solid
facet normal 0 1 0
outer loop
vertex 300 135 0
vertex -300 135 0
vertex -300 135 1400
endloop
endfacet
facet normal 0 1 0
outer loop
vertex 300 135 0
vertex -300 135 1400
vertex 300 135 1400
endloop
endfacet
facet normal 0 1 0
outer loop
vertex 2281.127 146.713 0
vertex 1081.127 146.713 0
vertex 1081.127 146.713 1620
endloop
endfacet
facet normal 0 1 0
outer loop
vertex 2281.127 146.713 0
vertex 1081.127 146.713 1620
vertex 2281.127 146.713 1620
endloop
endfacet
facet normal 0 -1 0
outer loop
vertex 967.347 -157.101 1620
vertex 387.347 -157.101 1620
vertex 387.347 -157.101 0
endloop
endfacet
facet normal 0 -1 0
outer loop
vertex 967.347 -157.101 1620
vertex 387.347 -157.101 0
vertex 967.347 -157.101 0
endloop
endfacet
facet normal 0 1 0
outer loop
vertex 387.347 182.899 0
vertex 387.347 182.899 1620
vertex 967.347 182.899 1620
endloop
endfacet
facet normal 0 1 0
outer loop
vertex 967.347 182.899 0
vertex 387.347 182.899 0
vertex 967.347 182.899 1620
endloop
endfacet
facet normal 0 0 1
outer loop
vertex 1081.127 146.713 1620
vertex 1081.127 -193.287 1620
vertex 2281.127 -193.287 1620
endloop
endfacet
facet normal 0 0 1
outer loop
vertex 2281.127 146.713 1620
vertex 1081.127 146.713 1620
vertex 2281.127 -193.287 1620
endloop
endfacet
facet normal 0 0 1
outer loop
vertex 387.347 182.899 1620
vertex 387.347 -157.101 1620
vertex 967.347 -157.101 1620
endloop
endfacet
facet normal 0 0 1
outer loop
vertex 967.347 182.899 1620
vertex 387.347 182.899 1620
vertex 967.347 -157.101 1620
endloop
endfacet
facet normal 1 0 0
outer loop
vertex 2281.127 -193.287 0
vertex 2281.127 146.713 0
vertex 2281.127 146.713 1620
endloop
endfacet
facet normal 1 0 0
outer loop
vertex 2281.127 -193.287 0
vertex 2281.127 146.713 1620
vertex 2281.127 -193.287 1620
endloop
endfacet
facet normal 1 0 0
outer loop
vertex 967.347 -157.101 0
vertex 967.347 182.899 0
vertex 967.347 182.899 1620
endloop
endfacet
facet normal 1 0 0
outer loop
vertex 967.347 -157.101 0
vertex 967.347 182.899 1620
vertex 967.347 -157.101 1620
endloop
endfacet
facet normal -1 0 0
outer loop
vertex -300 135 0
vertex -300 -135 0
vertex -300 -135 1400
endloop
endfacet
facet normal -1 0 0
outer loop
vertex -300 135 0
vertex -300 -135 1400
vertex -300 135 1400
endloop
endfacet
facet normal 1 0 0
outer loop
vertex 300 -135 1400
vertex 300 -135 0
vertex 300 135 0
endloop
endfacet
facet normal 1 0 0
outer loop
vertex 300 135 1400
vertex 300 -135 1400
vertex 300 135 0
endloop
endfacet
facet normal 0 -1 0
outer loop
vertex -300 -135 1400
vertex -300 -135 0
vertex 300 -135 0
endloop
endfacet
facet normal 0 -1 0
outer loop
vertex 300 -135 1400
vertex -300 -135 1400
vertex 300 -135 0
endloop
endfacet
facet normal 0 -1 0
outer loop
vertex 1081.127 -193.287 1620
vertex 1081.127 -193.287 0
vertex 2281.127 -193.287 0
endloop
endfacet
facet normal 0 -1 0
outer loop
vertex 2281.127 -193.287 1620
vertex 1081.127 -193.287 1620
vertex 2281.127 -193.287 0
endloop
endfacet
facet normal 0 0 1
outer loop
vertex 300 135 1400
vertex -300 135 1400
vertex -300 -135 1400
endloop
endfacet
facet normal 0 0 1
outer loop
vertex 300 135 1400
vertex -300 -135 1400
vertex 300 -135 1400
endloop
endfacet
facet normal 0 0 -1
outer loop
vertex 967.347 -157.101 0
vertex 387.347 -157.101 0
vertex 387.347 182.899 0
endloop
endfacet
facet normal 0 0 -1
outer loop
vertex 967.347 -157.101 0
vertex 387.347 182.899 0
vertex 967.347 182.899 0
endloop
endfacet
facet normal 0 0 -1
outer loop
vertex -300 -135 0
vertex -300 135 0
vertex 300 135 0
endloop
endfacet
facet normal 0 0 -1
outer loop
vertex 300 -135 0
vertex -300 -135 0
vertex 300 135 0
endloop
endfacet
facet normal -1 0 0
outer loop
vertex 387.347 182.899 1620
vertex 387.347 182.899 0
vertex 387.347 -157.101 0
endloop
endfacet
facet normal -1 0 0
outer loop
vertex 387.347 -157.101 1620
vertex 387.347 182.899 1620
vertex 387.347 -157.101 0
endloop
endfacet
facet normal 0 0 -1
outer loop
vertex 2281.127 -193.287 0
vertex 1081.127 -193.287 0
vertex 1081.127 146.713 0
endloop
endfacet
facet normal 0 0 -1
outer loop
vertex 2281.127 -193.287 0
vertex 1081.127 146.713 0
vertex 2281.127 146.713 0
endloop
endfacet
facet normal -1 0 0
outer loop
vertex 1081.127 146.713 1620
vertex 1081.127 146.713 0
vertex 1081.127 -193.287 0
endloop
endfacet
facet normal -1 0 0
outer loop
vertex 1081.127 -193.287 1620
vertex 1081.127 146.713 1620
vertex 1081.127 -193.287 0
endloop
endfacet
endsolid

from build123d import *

# Parameters (mm, degrees)
F0_W     = 600
F0_H     = 270
F1_DEPTH = 1400
F2_W     = 580
F2_H     = 340
F3_DEPTH = 1620
F4_W     = 1200
F4_H     = 340
F5_DEPTH = 1620


with BuildPart() as f1:
    # F0 (on Top) → F1 (new body)
    with BuildSketch(Plane.XY):
        Rectangle(F0_W, F0_H)
    extrude(amount=F1_DEPTH)


with BuildPart() as f3:
    # F2 (on face) → F3 (new body)
    with BuildSketch(Plane(origin=(0, 0, 0), x_dir=(1, 0, 0), z_dir=(0, 0, -1))):
        with Locations((677.347478, -12.898982)):
            Rectangle(F2_W, F2_H)
    extrude(amount=-F3_DEPTH)


with BuildPart() as f5:
    # F4 (on face) → F5 (new body)
    with BuildSketch(Plane(origin=(0, 0, 0), x_dir=(1, 0, 0), z_dir=(0, 0, -1))):
        with Locations((1681.126809, 23.286564)):
            Rectangle(F4_W, F4_H)
    extrude(amount=-F5_DEPTH)


solid = Compound([f1.part, f3.part, f5.part])
